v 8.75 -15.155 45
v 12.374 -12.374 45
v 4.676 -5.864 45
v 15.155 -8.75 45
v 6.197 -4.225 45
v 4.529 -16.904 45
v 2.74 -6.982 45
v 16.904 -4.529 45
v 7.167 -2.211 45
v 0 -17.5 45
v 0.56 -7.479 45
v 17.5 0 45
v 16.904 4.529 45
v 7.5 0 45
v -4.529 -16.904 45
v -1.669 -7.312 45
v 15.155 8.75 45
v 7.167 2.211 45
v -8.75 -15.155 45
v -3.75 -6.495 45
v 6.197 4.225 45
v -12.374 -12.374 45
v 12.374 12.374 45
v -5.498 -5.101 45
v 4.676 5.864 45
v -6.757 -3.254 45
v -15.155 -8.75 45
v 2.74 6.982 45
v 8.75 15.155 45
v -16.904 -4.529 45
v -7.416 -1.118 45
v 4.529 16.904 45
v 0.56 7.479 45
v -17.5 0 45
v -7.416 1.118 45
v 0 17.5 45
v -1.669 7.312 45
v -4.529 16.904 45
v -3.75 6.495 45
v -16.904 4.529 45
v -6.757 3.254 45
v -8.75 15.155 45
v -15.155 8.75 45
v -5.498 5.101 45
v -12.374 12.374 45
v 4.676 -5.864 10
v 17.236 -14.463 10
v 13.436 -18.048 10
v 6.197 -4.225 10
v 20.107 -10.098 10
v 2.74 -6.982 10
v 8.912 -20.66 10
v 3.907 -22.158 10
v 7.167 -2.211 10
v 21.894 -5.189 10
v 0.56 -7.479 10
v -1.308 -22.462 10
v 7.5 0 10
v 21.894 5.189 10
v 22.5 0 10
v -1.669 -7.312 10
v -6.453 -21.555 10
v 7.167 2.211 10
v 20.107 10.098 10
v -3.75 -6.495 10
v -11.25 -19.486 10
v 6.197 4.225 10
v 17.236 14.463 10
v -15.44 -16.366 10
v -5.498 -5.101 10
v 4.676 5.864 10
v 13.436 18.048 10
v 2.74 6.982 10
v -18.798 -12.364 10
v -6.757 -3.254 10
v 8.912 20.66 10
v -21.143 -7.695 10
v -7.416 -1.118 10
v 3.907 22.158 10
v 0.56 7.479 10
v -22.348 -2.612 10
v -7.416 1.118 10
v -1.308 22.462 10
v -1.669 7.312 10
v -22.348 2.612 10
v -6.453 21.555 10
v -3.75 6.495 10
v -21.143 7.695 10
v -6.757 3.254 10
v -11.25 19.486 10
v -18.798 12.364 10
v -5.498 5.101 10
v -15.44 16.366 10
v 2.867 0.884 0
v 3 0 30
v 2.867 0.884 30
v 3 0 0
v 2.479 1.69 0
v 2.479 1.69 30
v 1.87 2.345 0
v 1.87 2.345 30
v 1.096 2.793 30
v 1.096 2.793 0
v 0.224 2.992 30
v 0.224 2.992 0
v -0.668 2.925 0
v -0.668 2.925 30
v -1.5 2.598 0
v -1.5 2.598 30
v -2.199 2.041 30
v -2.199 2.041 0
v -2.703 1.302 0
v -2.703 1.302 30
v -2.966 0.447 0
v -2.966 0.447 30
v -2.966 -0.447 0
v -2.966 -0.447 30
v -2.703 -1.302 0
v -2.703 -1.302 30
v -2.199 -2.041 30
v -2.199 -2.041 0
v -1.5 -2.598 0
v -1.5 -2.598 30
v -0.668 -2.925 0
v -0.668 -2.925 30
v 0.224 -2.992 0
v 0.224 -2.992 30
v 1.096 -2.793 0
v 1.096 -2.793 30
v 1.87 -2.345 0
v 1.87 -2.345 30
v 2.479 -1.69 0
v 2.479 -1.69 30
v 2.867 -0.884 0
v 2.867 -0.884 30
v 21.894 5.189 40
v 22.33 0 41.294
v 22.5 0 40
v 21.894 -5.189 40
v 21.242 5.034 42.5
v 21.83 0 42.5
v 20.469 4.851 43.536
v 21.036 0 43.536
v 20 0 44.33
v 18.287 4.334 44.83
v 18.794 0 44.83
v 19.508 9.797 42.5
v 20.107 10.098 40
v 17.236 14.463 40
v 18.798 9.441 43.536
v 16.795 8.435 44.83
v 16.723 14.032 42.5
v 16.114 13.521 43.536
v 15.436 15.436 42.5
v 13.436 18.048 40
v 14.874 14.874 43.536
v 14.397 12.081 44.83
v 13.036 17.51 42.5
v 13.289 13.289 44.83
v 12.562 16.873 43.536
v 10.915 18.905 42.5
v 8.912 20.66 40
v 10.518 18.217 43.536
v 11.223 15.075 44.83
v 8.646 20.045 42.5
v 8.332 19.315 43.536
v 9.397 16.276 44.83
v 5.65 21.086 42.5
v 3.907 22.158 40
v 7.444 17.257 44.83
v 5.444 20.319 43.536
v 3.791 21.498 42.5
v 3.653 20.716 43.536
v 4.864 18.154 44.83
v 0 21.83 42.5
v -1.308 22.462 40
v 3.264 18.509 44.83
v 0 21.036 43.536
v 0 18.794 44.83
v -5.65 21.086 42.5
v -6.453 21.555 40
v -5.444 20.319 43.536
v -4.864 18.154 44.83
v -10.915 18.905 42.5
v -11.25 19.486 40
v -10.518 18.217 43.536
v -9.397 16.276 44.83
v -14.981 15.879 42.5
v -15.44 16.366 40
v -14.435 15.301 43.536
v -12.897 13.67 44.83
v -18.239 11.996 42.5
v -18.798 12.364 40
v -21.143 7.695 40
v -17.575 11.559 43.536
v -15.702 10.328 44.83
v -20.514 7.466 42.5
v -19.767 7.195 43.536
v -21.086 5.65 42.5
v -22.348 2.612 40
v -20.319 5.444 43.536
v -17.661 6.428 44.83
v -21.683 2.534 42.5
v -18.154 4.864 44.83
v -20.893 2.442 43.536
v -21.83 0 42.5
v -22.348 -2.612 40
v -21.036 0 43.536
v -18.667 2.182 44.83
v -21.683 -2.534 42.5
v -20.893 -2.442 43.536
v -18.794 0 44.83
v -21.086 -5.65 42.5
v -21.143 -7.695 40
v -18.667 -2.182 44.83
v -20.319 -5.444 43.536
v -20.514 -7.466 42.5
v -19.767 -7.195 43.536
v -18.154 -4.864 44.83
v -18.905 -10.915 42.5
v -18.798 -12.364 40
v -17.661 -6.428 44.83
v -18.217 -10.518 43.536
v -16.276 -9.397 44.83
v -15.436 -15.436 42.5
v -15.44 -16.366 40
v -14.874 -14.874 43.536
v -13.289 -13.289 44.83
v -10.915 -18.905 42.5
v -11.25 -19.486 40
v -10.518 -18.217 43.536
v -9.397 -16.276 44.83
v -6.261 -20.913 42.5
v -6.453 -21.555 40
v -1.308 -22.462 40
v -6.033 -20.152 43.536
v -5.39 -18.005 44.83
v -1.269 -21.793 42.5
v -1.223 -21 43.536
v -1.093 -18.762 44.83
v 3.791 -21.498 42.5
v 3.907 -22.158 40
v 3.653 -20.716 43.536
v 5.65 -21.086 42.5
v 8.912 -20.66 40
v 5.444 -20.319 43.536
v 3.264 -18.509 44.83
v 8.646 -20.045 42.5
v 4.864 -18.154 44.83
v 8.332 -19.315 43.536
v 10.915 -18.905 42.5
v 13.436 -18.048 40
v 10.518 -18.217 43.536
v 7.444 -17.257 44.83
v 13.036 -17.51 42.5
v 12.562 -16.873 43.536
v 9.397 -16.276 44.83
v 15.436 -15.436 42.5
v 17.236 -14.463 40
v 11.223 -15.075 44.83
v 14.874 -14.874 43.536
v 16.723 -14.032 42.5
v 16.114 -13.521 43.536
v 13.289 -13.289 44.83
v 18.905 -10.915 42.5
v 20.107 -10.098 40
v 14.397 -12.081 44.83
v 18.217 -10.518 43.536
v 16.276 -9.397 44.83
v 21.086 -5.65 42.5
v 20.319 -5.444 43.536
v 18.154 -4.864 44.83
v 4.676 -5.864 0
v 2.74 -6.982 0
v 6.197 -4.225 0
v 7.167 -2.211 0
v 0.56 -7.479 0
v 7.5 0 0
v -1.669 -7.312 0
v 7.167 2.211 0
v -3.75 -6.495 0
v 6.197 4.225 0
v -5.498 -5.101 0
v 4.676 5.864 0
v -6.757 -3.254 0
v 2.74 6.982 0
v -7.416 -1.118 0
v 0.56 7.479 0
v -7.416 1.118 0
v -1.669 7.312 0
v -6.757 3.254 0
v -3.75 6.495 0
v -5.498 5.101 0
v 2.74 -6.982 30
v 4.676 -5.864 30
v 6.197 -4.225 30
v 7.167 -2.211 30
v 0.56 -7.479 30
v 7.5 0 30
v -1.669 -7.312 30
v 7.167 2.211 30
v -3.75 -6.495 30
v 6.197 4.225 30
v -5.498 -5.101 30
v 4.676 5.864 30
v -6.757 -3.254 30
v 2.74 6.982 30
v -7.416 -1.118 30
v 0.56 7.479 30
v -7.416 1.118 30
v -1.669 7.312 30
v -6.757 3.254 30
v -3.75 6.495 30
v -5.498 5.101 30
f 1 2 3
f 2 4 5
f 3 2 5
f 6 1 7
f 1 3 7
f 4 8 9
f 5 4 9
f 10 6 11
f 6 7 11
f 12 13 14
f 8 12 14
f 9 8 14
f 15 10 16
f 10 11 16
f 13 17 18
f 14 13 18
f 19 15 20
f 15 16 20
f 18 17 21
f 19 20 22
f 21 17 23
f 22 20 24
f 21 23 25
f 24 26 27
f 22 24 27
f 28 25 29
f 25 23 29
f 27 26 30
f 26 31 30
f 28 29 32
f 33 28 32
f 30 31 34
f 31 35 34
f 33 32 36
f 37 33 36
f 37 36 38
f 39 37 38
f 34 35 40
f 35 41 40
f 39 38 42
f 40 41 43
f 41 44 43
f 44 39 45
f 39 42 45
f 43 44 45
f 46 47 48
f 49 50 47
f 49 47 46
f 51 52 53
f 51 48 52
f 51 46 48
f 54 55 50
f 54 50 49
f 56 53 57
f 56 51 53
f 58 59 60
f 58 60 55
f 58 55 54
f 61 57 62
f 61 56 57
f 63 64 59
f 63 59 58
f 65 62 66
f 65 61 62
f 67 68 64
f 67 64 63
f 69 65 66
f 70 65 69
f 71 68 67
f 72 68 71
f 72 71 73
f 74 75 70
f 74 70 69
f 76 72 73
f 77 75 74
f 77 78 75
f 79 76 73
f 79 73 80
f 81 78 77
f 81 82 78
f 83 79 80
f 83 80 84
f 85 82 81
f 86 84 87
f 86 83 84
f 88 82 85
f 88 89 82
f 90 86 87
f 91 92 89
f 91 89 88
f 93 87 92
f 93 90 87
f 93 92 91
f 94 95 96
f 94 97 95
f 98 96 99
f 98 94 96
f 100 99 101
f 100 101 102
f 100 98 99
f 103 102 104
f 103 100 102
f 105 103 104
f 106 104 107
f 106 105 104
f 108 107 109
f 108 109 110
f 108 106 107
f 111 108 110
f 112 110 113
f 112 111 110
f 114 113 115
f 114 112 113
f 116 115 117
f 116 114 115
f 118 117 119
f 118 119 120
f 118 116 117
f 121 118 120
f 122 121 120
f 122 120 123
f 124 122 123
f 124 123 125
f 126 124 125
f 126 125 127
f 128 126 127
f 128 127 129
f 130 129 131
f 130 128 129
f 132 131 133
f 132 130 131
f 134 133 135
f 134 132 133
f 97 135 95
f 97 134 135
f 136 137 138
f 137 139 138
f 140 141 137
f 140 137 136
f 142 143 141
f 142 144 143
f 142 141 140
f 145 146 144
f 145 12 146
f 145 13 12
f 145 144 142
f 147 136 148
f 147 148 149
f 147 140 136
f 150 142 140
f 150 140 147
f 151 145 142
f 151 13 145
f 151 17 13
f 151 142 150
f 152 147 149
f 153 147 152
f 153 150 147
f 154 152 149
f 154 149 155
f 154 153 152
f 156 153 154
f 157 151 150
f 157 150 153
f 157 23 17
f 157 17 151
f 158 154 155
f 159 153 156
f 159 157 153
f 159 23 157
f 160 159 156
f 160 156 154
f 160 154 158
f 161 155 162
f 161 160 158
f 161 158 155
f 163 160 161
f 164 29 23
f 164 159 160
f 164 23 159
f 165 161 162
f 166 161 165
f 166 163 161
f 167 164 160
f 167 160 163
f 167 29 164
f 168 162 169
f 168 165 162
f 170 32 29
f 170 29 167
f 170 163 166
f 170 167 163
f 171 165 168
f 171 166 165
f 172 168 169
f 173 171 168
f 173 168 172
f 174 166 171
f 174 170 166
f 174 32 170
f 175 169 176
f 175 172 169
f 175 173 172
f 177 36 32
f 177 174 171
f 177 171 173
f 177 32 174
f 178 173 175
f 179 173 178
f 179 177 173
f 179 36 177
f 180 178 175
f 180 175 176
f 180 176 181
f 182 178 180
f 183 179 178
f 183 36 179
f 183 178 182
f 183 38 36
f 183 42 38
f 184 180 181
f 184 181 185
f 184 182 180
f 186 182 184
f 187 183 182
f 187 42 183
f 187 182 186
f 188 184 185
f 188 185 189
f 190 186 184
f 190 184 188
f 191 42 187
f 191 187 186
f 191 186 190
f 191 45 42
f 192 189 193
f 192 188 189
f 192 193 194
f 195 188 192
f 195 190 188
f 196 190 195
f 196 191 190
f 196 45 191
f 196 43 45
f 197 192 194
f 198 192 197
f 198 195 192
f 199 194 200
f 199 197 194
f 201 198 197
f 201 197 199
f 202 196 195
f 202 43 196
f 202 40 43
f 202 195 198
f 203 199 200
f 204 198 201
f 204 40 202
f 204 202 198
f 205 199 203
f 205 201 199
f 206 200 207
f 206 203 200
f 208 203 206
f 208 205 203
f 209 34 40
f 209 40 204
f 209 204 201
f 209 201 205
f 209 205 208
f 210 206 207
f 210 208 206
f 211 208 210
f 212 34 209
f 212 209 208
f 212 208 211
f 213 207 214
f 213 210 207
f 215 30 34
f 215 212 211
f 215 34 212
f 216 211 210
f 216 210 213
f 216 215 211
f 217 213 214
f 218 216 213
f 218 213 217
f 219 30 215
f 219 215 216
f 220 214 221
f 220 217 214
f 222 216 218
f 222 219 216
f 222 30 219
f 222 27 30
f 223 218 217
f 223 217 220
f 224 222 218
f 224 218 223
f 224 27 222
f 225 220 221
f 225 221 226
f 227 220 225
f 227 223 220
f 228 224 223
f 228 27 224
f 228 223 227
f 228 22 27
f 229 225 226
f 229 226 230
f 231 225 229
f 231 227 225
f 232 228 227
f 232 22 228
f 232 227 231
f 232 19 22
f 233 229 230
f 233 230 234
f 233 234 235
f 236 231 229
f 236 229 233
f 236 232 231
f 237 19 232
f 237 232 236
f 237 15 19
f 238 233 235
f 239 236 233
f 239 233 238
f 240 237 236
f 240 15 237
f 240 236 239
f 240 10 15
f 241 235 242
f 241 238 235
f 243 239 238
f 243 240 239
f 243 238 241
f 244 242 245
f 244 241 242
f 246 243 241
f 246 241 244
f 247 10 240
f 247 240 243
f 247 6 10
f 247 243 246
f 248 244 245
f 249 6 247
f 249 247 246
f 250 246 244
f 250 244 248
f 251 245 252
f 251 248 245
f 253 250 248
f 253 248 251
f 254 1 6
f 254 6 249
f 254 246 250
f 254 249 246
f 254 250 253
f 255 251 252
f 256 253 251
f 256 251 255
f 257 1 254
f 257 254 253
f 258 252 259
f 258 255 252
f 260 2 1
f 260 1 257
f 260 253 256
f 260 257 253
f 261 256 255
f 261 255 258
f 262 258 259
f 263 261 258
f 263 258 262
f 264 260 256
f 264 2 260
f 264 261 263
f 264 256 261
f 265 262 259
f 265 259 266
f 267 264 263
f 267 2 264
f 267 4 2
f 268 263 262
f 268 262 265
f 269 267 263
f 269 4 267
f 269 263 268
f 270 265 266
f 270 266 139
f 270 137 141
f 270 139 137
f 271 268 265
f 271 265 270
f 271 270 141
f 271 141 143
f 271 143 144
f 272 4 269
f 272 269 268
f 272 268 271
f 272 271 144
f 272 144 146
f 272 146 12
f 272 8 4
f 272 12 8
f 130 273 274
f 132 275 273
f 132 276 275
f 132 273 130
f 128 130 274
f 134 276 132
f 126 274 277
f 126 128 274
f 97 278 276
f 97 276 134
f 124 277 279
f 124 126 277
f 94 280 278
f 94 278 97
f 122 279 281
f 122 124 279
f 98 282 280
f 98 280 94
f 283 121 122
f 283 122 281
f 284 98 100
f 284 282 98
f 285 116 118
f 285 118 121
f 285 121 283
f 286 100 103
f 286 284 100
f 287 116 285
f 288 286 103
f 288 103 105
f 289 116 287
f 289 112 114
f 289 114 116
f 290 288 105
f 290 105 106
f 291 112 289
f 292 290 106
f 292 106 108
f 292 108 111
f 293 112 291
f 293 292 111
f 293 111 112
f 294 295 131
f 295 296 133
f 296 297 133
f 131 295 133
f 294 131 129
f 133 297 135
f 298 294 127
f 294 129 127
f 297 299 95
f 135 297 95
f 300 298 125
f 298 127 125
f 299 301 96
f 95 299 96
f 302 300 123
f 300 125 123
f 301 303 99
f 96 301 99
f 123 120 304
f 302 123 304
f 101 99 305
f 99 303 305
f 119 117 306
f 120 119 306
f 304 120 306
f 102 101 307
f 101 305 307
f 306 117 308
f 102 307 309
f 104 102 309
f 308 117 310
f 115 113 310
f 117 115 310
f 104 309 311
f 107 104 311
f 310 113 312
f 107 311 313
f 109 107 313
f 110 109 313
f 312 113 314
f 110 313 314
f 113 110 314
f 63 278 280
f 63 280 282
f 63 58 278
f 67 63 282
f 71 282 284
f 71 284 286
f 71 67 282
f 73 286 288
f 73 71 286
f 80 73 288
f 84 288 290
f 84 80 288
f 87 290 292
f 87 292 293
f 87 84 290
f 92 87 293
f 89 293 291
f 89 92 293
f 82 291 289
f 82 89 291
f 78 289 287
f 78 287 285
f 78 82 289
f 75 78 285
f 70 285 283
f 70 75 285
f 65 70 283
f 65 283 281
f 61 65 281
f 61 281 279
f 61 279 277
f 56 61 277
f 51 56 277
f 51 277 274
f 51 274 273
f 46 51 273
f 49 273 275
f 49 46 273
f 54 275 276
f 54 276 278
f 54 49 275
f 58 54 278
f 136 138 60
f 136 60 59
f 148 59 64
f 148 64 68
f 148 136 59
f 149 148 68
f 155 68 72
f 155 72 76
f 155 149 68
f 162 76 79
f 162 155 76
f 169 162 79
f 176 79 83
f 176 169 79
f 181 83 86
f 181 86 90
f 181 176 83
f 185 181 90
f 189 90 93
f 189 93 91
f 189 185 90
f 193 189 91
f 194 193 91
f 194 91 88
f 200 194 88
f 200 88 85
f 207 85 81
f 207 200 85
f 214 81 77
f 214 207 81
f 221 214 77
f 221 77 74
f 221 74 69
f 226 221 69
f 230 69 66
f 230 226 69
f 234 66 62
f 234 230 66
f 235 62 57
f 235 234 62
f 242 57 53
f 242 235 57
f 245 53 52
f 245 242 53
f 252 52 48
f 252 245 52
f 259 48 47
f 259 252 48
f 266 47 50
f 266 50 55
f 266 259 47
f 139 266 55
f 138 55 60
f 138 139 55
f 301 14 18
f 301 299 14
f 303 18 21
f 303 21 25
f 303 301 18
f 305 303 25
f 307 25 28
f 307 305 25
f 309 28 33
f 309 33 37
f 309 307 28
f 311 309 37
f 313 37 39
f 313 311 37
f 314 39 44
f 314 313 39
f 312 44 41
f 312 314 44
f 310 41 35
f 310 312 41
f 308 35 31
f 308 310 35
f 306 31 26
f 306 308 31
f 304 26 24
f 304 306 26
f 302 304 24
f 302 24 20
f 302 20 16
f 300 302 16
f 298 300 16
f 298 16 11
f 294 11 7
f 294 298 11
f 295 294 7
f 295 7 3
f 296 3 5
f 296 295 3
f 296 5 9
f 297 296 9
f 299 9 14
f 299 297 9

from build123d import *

# Parameters (mm, degrees)
F0_W   = 15
F0_H   = 15
F0_H_2 = 20
F0_W_2 = 4.5
F0_H_3 = 10
F2_R   = 5


with BuildPart() as f1:
    # F0 (on Front) → F1 (revolve)
    with BuildSketch(Plane.XZ):
        with Locations((15, 37.5)):
            Rectangle(F0_W, F0_H)
        with Locations((15, 20)):
            Rectangle(F0_W, F0_H_2)
        with Locations((5.25, 20)):
            Rectangle(F0_W_2, F0_H_2)
        with Locations((5.25, 5)):
            Rectangle(F0_W_2, F0_H_3)
    revolve(axis=Axis((0, 0, 22.5), (0, 0, 1)))

    # F2
    f2_edges = [f1.edges().sort_by_distance(p)[0] for p in [
        (-22.5, 0, 45),
    ]]
    fillet(f2_edges, radius=F2_R)


solid = f1.part
